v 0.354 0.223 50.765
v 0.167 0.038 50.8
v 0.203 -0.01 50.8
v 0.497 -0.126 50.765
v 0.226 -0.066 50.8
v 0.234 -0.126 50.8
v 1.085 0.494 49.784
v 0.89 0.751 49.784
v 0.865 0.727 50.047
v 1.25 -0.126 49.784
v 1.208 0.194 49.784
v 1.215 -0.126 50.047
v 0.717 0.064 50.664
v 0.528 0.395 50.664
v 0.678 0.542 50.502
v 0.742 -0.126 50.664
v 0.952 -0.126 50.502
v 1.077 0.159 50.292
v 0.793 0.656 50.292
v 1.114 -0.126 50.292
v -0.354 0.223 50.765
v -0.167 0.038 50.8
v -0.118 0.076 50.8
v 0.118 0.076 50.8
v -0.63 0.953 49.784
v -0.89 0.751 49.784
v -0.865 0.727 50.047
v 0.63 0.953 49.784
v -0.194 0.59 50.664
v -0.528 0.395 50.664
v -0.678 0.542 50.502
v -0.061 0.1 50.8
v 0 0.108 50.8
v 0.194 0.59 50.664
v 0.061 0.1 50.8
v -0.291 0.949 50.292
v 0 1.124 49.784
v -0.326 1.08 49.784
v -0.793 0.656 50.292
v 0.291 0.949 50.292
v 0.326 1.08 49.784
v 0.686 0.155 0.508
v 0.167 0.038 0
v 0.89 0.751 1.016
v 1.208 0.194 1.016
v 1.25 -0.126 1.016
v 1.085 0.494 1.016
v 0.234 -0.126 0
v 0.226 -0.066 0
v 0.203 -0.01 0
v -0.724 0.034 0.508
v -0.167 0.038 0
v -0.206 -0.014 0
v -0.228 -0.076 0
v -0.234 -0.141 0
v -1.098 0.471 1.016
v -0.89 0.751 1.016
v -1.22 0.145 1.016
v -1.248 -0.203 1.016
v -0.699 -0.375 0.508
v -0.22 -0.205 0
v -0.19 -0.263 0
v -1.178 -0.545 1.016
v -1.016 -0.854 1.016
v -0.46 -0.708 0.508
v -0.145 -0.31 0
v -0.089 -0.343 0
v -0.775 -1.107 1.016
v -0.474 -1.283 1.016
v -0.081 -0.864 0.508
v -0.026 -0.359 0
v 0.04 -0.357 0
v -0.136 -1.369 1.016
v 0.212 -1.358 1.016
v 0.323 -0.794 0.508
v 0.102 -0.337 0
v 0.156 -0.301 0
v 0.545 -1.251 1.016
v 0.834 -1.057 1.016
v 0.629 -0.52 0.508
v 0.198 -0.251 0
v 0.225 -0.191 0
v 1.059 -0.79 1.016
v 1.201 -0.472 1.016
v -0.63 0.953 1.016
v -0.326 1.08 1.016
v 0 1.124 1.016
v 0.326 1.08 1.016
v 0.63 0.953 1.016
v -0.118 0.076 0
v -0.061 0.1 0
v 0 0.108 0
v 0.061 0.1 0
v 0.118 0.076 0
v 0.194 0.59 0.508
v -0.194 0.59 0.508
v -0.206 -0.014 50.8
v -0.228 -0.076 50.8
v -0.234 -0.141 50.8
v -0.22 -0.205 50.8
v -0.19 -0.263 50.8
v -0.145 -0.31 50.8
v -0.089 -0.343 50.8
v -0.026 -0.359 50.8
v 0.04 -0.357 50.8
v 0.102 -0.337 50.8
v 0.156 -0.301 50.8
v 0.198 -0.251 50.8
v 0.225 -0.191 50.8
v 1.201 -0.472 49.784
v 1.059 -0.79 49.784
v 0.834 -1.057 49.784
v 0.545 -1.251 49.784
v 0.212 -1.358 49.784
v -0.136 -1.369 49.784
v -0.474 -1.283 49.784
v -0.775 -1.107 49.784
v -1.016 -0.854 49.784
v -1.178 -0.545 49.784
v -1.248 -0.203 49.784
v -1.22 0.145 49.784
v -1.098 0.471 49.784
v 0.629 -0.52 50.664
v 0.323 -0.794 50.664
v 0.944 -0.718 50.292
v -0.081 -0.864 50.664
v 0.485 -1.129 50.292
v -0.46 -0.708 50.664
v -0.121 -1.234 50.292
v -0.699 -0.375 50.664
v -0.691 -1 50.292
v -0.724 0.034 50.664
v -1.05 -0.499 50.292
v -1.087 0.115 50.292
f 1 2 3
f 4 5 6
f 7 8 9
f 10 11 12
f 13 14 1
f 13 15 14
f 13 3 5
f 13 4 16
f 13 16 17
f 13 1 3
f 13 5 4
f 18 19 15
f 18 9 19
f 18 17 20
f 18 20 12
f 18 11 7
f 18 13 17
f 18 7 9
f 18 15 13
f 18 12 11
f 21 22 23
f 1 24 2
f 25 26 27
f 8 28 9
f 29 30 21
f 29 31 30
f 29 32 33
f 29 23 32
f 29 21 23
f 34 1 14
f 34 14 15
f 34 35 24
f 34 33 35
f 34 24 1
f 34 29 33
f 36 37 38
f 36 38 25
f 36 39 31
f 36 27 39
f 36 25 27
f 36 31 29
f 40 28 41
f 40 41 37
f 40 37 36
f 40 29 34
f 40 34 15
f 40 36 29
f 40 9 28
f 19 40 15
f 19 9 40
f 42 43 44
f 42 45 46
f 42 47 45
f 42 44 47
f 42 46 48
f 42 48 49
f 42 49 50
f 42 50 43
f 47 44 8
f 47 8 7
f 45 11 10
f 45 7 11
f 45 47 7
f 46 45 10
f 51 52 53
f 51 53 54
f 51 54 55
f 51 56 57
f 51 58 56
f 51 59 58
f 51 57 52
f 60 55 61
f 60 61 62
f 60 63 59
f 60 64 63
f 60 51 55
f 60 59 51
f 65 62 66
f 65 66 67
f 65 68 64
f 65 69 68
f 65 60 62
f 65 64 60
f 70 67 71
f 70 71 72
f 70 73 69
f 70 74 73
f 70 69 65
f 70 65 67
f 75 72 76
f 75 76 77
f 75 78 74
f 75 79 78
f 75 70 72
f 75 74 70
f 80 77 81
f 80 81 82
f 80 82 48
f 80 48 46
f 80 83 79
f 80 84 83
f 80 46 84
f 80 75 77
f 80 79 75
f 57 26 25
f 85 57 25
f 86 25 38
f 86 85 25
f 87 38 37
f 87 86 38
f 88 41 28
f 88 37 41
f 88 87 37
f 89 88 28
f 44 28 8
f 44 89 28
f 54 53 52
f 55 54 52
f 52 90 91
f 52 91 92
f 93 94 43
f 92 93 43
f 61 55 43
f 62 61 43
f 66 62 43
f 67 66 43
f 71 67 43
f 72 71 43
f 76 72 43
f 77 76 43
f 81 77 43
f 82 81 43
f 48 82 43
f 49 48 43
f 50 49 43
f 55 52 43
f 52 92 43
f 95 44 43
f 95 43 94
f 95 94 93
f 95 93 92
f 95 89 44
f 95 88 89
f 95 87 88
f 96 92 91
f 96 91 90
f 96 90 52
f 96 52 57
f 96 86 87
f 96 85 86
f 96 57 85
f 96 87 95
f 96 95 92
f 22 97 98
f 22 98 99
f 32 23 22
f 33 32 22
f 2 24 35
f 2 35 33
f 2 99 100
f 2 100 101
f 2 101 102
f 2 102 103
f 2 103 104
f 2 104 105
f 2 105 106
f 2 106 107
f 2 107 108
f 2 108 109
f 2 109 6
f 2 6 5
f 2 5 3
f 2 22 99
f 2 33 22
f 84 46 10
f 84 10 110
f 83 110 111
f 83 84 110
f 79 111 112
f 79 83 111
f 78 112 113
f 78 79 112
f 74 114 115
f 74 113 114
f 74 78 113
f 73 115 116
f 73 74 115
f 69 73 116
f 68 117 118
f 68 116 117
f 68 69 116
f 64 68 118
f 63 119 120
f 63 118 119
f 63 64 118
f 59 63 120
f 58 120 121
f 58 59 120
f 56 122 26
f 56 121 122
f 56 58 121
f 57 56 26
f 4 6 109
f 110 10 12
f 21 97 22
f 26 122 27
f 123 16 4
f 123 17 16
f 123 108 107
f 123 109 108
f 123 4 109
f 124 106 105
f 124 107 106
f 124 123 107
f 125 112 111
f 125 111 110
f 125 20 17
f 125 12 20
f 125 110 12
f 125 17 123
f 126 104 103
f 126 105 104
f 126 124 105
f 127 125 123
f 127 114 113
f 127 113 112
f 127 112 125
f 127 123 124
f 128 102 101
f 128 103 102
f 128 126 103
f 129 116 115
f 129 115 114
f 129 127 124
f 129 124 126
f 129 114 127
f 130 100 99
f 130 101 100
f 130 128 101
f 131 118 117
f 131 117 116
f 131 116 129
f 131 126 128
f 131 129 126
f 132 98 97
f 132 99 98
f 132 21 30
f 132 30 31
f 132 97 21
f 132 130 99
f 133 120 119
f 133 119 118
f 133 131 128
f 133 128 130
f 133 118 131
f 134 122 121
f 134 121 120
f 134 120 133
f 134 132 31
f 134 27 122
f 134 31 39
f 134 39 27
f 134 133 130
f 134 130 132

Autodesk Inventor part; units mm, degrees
ref_plane "YZ Plane" through (0, 0, 0) normal (1, 0, 0) x (0, 1, 0)
ref_plane "XZ Plane" through (0, 0, 0) normal (0, 1, 0) x (-1, 0, 0)
ref_plane "XY Plane" through (0, 0, 0) normal (0, 0, 1) x (1, 0, 0)
sketch "Sketch1" plane through (0, 0, 0) normal (0, 0, 1) x (1, 0, 0)
  arc A0 (-0.89, 0.7514) -> (0.89, 0.7514) centre (0, -0.1263) ccw projected
  circle A1 centre (0, -0.1263) radius 1.25
  point P0 (0, 0)
extrude "Extrusion1" add sketch "Sketch1" along normal blind 50.8
chamfer "Chamfer1" distance 1.016 angle 45 1 edges at (-1.25, -0.1263, 0)
fillet "Fillet1" radius 1.016 1 edges at (-1.25, -0.1263, 50.8)
properties part number "staff"
